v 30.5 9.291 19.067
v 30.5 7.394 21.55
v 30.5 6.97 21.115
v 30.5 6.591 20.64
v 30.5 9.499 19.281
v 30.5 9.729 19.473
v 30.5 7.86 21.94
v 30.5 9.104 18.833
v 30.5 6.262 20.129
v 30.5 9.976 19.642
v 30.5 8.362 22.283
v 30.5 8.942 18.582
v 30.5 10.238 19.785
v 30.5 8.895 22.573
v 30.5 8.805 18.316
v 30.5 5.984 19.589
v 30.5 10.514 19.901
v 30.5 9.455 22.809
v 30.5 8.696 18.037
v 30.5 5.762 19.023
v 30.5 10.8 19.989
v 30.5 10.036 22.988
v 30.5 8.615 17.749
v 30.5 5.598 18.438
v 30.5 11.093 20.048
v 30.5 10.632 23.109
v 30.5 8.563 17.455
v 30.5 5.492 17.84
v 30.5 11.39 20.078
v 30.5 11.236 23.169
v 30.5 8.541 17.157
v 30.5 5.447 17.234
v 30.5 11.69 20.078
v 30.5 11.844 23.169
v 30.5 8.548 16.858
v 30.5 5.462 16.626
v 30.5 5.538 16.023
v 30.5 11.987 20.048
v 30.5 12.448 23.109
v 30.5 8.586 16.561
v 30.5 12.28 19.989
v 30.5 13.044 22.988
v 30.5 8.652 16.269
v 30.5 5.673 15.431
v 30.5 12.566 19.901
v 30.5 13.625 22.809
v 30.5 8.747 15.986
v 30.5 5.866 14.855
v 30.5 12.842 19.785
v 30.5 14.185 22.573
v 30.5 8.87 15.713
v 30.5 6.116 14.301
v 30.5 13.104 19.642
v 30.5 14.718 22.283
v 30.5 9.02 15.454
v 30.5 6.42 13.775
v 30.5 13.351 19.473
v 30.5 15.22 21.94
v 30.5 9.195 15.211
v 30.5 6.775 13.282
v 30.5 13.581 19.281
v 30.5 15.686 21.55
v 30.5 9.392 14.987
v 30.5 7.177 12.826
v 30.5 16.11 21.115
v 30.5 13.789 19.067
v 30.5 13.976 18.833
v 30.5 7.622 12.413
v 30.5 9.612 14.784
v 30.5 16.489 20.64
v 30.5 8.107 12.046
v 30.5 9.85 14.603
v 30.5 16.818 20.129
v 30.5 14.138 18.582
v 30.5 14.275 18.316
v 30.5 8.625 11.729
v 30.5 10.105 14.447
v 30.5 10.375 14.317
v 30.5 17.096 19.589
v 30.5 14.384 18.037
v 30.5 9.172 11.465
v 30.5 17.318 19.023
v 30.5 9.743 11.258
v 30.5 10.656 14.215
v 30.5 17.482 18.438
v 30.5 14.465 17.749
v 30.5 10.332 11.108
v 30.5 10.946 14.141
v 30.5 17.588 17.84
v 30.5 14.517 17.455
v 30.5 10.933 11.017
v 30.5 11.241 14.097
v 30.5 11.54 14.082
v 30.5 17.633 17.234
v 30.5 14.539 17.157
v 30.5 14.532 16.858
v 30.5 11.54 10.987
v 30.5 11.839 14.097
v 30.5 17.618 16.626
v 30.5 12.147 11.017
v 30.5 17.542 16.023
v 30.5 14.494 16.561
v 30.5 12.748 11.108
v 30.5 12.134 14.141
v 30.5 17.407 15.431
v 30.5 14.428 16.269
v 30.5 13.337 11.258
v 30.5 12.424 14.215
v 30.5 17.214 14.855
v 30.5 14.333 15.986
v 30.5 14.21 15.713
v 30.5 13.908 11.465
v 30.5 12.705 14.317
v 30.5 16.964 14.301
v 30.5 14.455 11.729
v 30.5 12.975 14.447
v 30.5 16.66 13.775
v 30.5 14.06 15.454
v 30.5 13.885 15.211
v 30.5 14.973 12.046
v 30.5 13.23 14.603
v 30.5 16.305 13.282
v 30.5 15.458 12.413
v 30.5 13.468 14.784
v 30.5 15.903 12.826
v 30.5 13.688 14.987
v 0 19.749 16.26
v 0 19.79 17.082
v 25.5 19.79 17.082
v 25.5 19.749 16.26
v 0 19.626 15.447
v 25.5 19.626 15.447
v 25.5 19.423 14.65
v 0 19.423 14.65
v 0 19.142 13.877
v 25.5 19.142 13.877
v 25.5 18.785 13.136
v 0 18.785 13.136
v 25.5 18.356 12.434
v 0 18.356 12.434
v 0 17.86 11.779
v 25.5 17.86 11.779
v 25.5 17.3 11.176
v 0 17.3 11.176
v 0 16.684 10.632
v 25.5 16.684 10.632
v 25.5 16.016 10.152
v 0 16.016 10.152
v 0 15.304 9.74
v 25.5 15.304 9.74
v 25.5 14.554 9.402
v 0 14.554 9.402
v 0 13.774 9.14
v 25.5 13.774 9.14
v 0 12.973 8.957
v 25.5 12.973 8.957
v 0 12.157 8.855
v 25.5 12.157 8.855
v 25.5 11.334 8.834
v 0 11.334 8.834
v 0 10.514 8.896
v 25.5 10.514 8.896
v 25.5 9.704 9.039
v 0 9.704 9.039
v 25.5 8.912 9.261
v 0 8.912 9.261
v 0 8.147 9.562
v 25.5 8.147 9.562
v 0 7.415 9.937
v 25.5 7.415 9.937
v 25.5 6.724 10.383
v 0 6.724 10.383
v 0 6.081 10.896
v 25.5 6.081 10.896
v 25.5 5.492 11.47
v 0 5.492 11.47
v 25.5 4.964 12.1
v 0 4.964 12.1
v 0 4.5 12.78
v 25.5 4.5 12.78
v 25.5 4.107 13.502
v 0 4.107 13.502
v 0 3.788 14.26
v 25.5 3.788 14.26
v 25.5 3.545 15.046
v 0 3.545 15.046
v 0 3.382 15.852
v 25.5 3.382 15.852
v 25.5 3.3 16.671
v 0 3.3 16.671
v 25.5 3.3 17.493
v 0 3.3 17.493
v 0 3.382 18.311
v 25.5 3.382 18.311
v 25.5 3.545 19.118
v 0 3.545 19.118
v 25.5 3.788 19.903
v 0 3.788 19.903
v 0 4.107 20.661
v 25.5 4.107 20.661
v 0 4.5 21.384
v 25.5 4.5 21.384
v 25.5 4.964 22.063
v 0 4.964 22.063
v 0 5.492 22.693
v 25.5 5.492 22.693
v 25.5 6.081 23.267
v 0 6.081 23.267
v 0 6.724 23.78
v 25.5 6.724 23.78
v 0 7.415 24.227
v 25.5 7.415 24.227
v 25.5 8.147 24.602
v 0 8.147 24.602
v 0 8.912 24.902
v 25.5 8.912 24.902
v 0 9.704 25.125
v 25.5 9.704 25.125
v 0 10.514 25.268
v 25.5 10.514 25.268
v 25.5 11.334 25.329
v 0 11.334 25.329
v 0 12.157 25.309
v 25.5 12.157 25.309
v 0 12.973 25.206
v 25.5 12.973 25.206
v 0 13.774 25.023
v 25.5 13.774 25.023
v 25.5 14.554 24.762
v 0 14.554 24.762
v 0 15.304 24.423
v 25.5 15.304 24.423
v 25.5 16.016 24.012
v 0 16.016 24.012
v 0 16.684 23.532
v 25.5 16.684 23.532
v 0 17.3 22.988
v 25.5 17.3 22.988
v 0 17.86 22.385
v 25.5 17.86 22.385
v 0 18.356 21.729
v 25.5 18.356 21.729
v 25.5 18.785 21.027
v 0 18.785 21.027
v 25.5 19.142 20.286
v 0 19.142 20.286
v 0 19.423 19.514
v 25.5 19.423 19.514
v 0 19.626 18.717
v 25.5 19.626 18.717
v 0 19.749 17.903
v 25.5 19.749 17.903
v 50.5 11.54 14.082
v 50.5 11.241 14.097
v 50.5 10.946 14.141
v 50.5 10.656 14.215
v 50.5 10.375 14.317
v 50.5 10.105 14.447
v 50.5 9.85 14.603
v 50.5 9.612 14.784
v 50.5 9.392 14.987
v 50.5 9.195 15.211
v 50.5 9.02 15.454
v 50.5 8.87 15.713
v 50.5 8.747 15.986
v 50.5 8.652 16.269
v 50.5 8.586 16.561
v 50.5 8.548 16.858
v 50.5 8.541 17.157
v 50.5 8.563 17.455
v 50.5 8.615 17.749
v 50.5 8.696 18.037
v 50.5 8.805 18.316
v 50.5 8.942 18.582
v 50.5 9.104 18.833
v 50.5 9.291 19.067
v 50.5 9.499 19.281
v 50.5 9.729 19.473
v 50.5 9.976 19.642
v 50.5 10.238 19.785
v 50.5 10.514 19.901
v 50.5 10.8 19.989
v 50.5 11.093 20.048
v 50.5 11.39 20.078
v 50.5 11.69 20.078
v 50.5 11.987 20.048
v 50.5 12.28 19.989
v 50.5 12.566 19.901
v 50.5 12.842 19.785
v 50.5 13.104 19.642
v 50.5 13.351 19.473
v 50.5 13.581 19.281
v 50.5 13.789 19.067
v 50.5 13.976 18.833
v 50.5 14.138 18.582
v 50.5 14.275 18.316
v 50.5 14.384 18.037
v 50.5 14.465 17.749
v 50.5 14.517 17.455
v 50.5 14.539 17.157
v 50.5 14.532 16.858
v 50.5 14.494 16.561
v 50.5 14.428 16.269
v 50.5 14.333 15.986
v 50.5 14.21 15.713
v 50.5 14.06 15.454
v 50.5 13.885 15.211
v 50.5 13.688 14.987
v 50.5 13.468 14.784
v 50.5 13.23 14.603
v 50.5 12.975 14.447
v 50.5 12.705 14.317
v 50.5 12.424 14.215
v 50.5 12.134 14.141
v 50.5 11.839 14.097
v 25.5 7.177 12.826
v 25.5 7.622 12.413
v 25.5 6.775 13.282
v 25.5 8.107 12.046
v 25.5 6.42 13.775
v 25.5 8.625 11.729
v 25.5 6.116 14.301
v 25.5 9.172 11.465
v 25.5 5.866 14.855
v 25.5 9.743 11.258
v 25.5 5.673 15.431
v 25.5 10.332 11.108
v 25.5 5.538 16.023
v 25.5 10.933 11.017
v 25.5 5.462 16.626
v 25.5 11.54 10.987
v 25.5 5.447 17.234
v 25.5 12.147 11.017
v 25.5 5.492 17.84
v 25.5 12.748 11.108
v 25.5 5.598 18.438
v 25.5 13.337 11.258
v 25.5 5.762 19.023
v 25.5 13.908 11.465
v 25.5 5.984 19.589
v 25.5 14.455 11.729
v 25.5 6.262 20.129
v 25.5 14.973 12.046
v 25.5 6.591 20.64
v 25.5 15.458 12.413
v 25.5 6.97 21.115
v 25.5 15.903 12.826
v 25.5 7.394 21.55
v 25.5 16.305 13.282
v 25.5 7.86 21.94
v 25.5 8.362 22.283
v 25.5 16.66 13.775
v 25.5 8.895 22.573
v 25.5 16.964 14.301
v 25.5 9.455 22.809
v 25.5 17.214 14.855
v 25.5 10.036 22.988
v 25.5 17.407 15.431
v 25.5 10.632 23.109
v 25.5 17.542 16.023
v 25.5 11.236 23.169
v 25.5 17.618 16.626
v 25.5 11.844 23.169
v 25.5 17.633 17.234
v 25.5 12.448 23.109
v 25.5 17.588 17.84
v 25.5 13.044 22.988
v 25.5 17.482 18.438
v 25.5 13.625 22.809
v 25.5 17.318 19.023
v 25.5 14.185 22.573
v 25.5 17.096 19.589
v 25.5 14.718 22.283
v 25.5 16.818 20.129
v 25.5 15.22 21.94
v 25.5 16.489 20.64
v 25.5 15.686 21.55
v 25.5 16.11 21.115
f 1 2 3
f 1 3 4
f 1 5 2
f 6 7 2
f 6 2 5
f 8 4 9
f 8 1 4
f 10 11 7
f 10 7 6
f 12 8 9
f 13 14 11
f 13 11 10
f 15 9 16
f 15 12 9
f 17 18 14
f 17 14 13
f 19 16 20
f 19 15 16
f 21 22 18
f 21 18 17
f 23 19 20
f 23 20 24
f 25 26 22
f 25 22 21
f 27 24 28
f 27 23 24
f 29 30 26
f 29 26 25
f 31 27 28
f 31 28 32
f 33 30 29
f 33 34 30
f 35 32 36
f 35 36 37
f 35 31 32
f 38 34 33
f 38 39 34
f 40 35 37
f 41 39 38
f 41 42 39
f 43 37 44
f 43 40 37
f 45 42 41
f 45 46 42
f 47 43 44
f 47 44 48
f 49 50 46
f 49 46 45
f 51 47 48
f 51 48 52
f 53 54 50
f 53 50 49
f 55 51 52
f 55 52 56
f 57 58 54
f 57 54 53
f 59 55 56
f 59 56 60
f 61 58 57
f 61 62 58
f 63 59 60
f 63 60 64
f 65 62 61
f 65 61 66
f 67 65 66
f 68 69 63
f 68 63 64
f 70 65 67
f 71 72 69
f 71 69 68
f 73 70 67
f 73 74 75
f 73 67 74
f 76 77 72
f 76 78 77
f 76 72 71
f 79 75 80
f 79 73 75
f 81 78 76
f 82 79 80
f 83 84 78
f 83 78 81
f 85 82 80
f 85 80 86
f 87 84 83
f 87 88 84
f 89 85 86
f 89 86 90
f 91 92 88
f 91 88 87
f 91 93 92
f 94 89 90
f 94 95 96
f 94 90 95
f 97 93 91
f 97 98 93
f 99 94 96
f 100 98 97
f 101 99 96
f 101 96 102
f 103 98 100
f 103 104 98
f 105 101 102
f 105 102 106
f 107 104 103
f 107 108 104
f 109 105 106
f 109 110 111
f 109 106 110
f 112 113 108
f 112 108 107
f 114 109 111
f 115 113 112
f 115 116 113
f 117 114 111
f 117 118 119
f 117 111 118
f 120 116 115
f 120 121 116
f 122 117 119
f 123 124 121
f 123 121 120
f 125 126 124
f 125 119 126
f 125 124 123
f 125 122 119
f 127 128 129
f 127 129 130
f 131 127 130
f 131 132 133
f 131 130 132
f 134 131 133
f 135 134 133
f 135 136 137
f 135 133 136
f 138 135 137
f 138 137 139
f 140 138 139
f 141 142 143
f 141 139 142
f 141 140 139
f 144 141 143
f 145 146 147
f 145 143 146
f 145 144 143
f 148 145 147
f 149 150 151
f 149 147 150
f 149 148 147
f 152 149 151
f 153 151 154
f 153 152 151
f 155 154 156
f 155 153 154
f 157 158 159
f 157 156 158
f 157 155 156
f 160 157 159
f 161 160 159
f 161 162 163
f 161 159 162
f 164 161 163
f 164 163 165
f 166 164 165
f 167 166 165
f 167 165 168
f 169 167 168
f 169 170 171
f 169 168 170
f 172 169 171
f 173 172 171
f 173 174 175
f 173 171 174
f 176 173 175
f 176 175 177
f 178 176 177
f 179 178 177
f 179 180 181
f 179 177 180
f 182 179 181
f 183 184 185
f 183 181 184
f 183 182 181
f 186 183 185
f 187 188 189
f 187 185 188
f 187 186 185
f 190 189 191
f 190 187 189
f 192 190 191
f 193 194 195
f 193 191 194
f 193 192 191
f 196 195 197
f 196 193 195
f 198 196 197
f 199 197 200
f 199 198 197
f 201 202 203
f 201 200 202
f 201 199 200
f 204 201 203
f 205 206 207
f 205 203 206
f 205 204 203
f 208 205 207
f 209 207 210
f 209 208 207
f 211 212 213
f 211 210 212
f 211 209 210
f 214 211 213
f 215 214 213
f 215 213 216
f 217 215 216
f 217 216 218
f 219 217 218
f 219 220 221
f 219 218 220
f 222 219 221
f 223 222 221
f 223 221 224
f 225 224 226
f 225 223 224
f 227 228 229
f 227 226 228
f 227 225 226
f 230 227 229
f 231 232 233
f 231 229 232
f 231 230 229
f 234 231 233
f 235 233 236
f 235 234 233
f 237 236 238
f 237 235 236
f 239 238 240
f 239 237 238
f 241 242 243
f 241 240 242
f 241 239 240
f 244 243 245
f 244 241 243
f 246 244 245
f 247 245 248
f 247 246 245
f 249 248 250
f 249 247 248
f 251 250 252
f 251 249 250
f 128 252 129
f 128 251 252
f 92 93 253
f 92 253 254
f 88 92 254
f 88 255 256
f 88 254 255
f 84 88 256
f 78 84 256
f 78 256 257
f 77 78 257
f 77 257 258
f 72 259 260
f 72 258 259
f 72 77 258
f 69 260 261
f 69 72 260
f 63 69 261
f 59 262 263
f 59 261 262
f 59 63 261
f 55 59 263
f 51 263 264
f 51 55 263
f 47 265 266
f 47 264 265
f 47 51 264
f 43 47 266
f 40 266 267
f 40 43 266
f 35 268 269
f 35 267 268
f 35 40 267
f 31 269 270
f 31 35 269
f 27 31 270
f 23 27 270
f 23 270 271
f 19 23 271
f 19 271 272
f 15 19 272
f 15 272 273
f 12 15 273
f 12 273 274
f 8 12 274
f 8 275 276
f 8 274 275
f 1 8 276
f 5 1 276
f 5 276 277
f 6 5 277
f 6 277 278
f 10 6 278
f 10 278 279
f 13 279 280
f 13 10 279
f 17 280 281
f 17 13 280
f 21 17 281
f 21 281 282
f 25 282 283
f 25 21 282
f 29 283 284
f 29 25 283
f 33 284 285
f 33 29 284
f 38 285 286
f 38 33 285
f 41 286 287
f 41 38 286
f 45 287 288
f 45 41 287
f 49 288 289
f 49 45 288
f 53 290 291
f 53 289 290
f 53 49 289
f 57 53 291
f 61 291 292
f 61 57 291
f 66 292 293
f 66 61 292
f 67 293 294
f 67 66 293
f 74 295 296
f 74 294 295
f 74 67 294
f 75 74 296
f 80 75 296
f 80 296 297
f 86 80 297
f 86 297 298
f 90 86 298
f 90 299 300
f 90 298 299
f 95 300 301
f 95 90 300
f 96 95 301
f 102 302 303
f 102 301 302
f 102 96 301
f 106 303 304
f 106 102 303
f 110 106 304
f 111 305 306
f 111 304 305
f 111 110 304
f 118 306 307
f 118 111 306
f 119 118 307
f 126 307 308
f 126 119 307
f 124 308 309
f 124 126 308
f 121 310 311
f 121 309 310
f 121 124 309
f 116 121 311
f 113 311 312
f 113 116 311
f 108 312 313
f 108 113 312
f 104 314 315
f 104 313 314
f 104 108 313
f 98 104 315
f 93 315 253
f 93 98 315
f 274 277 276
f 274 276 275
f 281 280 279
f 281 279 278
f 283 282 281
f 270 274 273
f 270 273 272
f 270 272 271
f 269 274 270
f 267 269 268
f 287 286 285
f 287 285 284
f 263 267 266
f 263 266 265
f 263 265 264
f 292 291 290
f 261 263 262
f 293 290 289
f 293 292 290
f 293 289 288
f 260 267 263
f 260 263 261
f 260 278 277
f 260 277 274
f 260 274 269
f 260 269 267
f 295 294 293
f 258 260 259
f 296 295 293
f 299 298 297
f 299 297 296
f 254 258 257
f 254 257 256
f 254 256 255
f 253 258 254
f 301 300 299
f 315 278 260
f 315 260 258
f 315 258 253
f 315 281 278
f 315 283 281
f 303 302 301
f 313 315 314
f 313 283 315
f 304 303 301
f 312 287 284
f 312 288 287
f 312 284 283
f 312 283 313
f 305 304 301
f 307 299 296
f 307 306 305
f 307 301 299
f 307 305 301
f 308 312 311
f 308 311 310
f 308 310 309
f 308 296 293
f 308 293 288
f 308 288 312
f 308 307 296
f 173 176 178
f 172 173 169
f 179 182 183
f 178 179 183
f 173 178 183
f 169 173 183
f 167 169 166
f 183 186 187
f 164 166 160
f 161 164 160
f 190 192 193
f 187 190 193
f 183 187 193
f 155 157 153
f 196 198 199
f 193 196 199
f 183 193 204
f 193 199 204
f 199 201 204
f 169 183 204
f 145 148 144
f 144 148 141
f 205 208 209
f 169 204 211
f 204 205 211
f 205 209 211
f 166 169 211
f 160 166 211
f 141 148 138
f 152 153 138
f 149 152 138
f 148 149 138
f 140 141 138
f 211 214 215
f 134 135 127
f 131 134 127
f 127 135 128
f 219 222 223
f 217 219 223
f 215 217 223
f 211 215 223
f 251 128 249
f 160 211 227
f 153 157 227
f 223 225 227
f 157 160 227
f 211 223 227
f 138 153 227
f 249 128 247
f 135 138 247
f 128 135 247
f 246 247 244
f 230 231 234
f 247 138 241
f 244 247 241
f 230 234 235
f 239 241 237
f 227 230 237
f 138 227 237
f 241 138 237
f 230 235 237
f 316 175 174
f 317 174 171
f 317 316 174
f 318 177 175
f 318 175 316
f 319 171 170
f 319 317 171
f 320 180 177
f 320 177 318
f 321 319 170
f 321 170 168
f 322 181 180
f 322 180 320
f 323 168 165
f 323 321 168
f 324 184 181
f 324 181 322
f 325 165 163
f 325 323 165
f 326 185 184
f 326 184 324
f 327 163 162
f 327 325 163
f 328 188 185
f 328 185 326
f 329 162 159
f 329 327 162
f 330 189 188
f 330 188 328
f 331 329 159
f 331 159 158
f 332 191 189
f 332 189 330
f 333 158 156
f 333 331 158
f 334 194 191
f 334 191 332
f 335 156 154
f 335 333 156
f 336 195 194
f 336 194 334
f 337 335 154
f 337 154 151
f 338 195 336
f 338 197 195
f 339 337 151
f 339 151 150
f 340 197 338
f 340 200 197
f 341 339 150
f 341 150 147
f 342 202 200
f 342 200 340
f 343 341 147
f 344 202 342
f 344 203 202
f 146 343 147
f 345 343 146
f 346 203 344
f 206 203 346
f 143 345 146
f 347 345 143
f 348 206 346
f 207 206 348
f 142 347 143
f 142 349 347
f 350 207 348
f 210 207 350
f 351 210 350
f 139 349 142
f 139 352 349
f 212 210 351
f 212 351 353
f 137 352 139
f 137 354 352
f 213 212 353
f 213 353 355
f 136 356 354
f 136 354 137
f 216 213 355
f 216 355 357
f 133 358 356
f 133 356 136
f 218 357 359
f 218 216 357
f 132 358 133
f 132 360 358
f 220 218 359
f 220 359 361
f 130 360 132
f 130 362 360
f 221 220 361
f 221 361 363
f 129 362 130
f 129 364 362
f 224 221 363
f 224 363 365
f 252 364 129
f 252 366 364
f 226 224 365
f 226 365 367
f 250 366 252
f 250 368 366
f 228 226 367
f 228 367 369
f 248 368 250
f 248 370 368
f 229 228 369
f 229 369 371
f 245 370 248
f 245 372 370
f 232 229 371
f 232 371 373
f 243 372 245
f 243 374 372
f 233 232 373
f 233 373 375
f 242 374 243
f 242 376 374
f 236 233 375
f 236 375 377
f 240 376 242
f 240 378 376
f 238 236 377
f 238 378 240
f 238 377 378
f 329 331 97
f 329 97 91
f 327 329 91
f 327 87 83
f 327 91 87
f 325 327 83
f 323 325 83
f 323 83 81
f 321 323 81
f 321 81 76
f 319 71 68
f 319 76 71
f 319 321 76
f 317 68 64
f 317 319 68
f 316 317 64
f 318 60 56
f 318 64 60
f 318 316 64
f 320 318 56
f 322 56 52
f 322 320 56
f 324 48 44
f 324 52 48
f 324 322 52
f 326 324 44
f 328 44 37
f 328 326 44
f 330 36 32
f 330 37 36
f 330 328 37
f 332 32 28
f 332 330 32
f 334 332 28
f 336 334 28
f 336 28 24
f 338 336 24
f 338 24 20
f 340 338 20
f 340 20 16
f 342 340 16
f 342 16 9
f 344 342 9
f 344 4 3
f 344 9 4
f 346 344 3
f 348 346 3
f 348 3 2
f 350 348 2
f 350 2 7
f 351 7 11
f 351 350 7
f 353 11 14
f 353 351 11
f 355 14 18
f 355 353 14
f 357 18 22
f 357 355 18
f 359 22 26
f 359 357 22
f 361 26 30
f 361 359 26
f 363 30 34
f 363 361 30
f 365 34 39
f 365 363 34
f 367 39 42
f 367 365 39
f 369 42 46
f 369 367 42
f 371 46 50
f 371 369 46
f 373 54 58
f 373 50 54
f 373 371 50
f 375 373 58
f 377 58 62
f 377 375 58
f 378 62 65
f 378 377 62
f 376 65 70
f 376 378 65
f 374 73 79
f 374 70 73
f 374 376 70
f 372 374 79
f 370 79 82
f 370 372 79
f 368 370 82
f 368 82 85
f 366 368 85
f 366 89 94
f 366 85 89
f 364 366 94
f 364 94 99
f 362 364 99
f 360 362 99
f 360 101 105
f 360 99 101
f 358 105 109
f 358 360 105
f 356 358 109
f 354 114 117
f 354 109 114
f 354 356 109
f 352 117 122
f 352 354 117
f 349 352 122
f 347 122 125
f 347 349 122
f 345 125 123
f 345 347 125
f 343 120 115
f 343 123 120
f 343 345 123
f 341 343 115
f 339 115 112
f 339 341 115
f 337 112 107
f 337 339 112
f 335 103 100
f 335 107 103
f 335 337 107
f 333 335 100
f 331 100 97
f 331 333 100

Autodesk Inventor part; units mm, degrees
ref_plane "YZ Plane" through (0, 0, 0) normal (1, 0, 0) x (0, 1, 0)
ref_plane "XZ Plane" through (0, 0, 0) normal (0, 1, 0) x (-1, 0, 0)
ref_plane "XY Plane" through (0, 0, 0) normal (0, 0, 1) x (1, 0, 0)
sketch "Sketch1" plane through (0, 0, 0) normal (1, 0, 0) x (0, 1, 0)
  circle A0 centre (11.54, 17.0818) radius 8.25
  point P0 (0, 0)
  dimension "d0" = 16.5
extrude "Plate1" add sketch "Sketch1" along normal blind 25.5
sketch "Sketch2" plane through (25.5, 11.54, 17.0818) normal (1, 0, 0) x (0, 0, -1)
  circle A0 centre (0, 0) radius 6.095
  point P0 (17.0818, -11.54)
  dimension "d2" = 12.19
extrude "Extrusion1" add sketch "Sketch2" along normal blind 5
sketch "Sketch3" plane through (30.5, 11.54, 17.0818) normal (1, 0, 0) x (0, 0, -1)
  circle A0 centre (0, 0) radius 3
  point P0 (17.0818, -11.54)
  dimension "d5" = 6
extrude "Extrusion2" add sketch "Sketch3" along normal blind 20
equation "\"d1\" = Thickness"
equation "\"BendRadius\" = Thickness"
equation "\"BendReliefWidth\" = Thickness"
equation "\"BendReliefDepth\" = 0.5 * Thickness"
equation "\"CornerReliefSize\" = 4 * Thickness"
equation "\"MinimumRemnant\" = 2 * Thickness"
equation "\"TransitionRadius\" = BendRadius"
equation "\"JacobiRadiusSize\" = BendRadius"
equation "\"GapSize\" = Thickness"
equation "\"Thickness\" = 25.5"
properties part number "dccc"
